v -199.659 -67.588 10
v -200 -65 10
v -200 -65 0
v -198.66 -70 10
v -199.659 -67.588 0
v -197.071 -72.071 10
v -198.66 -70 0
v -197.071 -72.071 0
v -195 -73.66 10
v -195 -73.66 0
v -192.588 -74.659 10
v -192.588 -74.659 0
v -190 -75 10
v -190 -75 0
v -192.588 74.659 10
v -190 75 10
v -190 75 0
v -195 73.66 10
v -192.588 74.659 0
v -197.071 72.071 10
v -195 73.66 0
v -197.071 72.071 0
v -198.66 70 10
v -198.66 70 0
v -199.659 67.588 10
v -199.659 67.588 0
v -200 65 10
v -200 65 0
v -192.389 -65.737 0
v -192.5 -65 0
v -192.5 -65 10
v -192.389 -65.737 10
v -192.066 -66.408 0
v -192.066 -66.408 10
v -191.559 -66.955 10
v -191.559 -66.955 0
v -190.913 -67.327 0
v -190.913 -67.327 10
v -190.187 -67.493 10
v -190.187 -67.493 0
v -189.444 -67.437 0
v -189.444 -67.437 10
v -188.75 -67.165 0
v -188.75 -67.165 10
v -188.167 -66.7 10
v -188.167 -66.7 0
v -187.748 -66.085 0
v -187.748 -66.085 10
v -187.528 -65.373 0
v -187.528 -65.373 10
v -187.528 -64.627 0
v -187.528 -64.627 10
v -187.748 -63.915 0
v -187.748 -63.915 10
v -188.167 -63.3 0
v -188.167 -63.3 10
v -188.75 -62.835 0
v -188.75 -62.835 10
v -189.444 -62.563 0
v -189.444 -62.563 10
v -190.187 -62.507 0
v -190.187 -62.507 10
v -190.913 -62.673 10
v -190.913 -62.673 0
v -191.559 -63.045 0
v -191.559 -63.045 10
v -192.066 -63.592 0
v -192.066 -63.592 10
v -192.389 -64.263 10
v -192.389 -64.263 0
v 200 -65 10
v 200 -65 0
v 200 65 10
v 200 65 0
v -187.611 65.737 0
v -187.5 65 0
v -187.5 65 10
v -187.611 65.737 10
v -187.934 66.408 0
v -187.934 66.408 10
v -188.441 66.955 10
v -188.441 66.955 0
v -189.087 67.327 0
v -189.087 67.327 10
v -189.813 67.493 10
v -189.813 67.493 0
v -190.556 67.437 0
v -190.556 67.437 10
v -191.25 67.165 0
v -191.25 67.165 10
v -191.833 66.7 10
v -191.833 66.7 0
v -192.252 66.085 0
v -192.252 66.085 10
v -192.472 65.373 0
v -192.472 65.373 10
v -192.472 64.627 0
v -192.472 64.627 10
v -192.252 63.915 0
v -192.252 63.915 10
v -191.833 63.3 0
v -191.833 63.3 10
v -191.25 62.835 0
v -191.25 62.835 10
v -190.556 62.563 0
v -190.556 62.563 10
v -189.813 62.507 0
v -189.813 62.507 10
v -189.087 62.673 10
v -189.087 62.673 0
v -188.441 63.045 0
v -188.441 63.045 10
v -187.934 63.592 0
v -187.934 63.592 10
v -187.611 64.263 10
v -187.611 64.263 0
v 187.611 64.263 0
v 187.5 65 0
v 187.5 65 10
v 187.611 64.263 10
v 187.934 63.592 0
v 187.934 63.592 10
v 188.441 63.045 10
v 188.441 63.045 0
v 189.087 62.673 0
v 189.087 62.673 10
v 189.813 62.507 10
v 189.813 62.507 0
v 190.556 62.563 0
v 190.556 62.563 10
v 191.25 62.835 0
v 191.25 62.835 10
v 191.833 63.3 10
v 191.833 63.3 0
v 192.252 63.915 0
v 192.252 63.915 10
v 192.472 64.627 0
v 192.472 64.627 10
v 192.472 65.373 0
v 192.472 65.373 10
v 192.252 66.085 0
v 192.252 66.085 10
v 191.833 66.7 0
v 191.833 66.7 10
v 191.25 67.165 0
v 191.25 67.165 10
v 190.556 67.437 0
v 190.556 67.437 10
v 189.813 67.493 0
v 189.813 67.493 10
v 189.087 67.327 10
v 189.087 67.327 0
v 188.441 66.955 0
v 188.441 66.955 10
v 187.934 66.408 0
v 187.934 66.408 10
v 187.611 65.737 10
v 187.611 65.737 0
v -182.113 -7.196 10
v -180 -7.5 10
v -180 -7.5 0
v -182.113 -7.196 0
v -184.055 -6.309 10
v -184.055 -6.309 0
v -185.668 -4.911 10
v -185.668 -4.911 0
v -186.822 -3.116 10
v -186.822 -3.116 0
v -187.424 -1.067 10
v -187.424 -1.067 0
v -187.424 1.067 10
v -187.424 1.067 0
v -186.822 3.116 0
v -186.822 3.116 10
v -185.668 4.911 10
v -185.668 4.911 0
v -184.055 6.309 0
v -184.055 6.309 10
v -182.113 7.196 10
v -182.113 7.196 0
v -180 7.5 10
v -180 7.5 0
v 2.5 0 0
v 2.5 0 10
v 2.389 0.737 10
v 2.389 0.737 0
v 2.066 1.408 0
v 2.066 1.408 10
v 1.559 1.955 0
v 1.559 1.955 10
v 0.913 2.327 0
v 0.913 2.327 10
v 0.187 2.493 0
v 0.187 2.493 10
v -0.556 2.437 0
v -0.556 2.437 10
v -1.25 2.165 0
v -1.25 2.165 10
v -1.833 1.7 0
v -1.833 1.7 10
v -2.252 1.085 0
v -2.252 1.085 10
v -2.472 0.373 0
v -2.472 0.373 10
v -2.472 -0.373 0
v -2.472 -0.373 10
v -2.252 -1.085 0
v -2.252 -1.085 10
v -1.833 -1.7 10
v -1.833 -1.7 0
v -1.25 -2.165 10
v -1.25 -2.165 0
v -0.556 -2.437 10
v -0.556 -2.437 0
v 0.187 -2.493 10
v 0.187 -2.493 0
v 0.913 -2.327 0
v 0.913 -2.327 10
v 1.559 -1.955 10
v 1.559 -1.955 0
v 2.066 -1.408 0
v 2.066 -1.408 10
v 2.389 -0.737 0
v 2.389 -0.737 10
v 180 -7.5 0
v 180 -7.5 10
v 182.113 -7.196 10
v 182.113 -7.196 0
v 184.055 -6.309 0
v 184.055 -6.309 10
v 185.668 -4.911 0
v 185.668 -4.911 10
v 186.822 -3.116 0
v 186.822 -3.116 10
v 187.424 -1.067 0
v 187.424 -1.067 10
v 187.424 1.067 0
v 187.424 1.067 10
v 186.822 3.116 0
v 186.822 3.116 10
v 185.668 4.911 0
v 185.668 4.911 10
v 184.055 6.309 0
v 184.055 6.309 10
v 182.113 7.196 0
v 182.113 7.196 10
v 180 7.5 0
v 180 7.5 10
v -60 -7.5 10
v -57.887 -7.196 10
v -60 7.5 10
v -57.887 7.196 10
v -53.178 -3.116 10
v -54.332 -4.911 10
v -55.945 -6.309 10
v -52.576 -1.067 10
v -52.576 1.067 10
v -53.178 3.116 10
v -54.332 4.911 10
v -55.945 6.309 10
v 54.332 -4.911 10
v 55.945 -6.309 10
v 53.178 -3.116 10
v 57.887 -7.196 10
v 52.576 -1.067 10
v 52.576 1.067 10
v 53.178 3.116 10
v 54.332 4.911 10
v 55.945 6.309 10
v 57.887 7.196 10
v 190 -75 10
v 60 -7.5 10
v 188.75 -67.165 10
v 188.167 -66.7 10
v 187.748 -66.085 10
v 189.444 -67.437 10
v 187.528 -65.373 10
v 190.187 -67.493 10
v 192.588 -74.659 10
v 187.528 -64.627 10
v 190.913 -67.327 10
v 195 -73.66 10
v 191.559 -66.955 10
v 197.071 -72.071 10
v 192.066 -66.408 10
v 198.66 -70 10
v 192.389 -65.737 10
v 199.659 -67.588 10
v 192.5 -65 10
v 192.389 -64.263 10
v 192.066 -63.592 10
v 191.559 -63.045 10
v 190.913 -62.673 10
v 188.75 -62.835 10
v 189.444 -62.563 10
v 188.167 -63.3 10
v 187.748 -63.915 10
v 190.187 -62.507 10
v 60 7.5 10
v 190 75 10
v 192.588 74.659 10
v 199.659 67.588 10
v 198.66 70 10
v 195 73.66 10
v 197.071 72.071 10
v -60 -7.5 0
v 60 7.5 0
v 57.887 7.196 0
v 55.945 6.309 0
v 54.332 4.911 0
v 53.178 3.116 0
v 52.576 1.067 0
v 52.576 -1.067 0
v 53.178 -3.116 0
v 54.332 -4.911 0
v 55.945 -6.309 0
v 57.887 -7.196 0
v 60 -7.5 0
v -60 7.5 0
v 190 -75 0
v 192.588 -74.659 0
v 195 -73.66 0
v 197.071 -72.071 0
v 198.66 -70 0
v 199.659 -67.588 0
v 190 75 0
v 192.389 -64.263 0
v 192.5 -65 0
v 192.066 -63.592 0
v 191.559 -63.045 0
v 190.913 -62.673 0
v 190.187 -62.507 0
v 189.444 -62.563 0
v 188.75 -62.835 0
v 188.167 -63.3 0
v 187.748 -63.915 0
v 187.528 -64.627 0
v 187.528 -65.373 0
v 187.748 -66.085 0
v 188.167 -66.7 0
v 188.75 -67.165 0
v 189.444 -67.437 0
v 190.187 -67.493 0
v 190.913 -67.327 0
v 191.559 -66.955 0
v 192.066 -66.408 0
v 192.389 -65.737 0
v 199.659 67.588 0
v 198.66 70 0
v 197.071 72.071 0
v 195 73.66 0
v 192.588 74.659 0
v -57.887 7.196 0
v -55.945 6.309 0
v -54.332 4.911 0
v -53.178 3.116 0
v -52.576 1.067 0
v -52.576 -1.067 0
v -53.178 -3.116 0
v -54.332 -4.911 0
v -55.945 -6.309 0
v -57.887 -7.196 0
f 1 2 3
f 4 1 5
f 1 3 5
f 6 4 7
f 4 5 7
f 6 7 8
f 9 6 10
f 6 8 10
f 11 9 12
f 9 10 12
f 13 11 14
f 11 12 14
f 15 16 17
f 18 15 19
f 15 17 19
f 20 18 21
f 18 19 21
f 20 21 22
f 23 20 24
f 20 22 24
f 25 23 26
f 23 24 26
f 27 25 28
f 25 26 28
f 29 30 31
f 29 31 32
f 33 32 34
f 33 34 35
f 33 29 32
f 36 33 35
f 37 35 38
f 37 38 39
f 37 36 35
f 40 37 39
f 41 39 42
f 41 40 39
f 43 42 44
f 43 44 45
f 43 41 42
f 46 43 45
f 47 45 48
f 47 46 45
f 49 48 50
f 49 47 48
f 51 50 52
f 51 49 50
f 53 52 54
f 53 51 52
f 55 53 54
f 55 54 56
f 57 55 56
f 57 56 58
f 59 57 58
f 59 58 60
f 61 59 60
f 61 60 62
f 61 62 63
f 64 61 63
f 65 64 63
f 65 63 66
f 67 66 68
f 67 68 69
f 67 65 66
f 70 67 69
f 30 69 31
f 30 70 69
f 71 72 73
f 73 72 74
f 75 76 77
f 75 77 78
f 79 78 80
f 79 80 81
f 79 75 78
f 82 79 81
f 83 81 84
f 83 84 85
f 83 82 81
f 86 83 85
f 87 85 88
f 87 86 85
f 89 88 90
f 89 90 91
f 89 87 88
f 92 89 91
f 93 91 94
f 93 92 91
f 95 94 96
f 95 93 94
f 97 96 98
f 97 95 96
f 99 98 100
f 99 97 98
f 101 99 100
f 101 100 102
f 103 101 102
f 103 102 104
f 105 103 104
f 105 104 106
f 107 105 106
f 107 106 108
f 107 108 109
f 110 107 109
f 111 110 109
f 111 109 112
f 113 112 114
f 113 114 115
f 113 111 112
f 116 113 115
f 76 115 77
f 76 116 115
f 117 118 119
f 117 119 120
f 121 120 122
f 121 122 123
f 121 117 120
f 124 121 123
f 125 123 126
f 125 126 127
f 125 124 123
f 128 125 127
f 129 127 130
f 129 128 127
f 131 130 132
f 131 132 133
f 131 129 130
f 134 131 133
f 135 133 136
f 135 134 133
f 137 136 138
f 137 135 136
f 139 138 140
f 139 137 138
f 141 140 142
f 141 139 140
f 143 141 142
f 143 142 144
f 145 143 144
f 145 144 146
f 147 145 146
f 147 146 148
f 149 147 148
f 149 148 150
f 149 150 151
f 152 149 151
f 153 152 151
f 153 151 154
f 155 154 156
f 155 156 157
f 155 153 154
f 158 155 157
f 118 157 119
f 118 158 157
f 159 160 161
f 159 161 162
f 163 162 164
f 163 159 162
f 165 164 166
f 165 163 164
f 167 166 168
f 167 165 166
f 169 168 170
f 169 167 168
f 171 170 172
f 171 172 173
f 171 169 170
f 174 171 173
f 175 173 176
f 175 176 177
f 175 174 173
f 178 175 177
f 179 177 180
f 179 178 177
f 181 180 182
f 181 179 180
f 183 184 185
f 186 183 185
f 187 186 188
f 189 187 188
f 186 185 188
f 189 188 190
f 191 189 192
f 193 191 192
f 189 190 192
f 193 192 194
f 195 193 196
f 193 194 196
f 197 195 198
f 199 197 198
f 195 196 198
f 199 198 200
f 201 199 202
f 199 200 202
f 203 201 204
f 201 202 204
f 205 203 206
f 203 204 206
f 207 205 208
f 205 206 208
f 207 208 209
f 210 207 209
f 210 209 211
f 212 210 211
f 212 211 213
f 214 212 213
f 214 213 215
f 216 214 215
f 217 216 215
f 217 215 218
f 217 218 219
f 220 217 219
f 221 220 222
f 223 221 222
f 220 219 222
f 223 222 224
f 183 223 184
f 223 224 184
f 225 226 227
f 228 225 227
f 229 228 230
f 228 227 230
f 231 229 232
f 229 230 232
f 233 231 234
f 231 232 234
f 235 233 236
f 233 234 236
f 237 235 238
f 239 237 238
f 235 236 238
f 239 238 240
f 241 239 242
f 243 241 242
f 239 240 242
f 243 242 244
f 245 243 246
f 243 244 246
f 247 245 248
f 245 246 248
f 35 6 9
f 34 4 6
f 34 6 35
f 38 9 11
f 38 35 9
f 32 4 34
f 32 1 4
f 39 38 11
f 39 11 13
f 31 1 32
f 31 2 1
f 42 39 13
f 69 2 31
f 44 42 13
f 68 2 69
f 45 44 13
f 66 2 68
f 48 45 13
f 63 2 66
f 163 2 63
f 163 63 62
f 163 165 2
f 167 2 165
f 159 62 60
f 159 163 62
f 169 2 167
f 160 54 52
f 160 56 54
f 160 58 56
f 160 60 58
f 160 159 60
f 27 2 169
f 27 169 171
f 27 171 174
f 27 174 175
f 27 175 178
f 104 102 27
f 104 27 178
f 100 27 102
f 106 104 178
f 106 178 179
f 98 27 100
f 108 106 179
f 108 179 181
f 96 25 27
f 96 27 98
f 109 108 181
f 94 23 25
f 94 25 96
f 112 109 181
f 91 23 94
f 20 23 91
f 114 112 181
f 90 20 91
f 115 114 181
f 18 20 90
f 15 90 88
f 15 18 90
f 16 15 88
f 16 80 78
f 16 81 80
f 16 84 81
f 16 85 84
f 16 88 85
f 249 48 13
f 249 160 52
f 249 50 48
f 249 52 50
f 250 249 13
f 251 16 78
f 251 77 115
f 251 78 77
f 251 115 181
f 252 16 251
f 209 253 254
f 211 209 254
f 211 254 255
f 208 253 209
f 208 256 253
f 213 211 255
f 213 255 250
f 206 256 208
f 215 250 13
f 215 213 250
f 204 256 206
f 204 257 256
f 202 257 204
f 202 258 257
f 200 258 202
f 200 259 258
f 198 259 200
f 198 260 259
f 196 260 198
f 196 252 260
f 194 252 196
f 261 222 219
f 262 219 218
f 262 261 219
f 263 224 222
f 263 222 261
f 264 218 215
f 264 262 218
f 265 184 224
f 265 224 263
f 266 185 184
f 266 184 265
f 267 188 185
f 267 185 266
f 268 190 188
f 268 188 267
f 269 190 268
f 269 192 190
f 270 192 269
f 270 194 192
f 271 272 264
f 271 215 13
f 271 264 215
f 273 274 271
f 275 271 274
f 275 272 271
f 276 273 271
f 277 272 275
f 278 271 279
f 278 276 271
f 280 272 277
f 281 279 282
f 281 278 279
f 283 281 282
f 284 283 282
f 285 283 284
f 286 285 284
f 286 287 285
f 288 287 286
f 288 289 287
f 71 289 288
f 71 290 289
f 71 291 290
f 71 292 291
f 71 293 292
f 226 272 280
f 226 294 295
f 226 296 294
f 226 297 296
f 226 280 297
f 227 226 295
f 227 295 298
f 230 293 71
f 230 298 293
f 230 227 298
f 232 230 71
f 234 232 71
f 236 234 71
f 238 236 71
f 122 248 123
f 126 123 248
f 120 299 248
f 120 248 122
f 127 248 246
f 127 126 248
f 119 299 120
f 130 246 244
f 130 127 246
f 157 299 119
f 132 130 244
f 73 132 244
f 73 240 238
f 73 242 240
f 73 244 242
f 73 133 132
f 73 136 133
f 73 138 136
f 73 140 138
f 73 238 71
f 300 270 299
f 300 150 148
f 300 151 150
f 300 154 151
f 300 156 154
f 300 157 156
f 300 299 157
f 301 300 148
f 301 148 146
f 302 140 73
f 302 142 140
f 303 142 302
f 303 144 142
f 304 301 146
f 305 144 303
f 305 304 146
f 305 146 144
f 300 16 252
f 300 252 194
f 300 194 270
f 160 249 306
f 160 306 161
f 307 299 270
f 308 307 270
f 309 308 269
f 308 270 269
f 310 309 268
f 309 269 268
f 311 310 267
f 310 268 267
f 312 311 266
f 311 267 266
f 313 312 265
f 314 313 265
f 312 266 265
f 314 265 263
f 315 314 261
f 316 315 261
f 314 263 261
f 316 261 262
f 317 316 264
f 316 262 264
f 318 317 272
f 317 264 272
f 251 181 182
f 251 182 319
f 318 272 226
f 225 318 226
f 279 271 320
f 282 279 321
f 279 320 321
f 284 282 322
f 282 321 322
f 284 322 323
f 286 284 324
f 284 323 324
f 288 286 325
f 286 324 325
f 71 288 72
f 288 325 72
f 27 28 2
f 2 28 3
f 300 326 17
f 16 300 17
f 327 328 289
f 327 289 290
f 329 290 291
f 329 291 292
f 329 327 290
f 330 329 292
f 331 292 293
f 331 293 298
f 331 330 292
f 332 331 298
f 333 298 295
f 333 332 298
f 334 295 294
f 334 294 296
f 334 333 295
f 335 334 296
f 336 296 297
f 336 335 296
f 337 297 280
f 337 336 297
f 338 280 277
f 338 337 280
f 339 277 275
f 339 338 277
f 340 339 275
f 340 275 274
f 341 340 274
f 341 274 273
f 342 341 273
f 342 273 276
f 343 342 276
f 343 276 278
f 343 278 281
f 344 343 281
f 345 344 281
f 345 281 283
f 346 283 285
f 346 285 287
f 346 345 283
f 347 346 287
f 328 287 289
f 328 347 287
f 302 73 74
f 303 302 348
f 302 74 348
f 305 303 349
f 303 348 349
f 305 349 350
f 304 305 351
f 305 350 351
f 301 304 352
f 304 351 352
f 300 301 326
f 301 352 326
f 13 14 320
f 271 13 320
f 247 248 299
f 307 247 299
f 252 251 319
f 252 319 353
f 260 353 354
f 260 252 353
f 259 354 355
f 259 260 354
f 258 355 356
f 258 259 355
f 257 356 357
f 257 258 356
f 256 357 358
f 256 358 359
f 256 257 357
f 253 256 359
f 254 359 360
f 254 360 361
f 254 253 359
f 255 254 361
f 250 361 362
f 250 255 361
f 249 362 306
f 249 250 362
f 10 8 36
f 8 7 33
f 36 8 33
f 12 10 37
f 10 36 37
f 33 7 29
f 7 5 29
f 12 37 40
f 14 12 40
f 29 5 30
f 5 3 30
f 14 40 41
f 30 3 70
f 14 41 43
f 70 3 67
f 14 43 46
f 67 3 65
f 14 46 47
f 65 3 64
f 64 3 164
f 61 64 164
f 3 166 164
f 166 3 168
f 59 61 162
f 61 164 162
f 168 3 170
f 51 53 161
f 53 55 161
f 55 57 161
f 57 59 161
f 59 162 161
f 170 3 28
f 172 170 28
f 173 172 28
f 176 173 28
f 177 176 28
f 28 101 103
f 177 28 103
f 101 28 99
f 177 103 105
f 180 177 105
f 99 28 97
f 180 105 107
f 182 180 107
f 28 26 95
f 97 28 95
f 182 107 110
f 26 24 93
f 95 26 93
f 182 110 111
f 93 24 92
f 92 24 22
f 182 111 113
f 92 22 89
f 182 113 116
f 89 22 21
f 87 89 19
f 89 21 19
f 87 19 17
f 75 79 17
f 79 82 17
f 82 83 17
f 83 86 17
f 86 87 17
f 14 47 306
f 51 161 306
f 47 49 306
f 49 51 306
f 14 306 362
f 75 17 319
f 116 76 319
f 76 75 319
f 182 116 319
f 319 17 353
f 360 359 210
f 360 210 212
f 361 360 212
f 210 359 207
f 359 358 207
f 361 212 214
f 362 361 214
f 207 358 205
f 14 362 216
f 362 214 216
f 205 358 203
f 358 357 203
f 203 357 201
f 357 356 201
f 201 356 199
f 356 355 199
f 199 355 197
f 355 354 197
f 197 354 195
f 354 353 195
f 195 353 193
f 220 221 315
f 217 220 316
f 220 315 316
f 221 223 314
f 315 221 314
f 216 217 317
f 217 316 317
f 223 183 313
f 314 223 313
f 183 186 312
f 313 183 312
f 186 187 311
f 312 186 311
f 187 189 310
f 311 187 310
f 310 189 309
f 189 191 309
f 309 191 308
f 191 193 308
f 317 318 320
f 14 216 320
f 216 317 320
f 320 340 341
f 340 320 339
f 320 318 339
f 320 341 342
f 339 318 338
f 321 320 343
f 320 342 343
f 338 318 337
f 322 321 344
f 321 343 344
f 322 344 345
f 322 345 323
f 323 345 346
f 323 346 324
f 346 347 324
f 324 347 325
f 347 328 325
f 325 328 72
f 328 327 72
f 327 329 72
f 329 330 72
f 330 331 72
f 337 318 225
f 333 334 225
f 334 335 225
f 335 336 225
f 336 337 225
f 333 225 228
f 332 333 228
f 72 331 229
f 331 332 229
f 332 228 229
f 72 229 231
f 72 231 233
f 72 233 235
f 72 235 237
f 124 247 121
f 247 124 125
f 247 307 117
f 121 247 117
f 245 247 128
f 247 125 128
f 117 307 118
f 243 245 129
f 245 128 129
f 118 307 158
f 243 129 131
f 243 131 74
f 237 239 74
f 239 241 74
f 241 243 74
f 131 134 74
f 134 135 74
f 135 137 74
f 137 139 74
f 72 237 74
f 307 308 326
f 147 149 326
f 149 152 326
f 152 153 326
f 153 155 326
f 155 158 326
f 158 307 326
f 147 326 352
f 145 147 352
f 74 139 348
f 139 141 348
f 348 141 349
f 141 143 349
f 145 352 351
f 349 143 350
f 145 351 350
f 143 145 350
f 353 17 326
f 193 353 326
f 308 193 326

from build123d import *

# Parameters (mm, degrees)
SKETCH1_R           = 2.5
BOSS_EXTRUDE1_DEPTH = 10
SKETCH2_R           = 2.5
CUT_EXTRUDE1_DEPTH  = 10


with BuildPart() as part:
    # Sketch1 → Boss-Extrude1 (new body)
    with BuildSketch(Plane.XY):
        with BuildLine():
            Line((-190, -75), (190, -75))
            ThreePointArc((190, -75), (197.071067812, -72.071067812), (200, -65))
            Line((200, -65), (200, 65))
            ThreePointArc((200, 65), (197.071067812, 72.071067812), (190, 75))
            Line((190, 75), (-190, 75))
            ThreePointArc((-190, 75), (-197.071067812, 72.071067812), (-200, 65))
            Line((-200, 65), (-200, -65))
            ThreePointArc((-200, -65), (-197.071067812, -72.071067812), (-190, -75))
        make_face()
        with Locations((-190, 65)):
            Circle(SKETCH1_R, mode=Mode.SUBTRACT)
        with Locations(Location((-190, -65, 0), (0, 0, 180))):
            Circle(SKETCH1_R, mode=Mode.SUBTRACT)
        with Locations((190, -65)):
            Circle(SKETCH1_R, mode=Mode.SUBTRACT)
        with Locations(Location((190, 65, 0), (0, 0, 180))):
            Circle(SKETCH1_R, mode=Mode.SUBTRACT)
    extrude(amount=BOSS_EXTRUDE1_DEPTH)

    # Sketch2 → Cut-Extrude1 (cut)
    with BuildSketch(Plane.XY.offset(10)):
        Circle(SKETCH2_R)
        with BuildLine():
            Line((-60, -7.5), (-180, -7.5))
            ThreePointArc((-180, -7.5), (-187.5, 0), (-180, 7.5))
            Line((-180, 7.5), (-60, 7.5))
            ThreePointArc((-60, 7.5), (-52.5, 0), (-60, -7.5))
        make_face()
        with BuildLine():
            Line((60, -7.5), (180, -7.5))
            ThreePointArc((180, -7.5), (187.5, 0), (180, 7.5))
            Line((180, 7.5), (60, 7.5))
            ThreePointArc((60, 7.5), (52.5, 0), (60, -7.5))
        make_face()
    extrude(amount=-CUT_EXTRUDE1_DEPTH, mode=Mode.SUBTRACT)


solid = part.part
